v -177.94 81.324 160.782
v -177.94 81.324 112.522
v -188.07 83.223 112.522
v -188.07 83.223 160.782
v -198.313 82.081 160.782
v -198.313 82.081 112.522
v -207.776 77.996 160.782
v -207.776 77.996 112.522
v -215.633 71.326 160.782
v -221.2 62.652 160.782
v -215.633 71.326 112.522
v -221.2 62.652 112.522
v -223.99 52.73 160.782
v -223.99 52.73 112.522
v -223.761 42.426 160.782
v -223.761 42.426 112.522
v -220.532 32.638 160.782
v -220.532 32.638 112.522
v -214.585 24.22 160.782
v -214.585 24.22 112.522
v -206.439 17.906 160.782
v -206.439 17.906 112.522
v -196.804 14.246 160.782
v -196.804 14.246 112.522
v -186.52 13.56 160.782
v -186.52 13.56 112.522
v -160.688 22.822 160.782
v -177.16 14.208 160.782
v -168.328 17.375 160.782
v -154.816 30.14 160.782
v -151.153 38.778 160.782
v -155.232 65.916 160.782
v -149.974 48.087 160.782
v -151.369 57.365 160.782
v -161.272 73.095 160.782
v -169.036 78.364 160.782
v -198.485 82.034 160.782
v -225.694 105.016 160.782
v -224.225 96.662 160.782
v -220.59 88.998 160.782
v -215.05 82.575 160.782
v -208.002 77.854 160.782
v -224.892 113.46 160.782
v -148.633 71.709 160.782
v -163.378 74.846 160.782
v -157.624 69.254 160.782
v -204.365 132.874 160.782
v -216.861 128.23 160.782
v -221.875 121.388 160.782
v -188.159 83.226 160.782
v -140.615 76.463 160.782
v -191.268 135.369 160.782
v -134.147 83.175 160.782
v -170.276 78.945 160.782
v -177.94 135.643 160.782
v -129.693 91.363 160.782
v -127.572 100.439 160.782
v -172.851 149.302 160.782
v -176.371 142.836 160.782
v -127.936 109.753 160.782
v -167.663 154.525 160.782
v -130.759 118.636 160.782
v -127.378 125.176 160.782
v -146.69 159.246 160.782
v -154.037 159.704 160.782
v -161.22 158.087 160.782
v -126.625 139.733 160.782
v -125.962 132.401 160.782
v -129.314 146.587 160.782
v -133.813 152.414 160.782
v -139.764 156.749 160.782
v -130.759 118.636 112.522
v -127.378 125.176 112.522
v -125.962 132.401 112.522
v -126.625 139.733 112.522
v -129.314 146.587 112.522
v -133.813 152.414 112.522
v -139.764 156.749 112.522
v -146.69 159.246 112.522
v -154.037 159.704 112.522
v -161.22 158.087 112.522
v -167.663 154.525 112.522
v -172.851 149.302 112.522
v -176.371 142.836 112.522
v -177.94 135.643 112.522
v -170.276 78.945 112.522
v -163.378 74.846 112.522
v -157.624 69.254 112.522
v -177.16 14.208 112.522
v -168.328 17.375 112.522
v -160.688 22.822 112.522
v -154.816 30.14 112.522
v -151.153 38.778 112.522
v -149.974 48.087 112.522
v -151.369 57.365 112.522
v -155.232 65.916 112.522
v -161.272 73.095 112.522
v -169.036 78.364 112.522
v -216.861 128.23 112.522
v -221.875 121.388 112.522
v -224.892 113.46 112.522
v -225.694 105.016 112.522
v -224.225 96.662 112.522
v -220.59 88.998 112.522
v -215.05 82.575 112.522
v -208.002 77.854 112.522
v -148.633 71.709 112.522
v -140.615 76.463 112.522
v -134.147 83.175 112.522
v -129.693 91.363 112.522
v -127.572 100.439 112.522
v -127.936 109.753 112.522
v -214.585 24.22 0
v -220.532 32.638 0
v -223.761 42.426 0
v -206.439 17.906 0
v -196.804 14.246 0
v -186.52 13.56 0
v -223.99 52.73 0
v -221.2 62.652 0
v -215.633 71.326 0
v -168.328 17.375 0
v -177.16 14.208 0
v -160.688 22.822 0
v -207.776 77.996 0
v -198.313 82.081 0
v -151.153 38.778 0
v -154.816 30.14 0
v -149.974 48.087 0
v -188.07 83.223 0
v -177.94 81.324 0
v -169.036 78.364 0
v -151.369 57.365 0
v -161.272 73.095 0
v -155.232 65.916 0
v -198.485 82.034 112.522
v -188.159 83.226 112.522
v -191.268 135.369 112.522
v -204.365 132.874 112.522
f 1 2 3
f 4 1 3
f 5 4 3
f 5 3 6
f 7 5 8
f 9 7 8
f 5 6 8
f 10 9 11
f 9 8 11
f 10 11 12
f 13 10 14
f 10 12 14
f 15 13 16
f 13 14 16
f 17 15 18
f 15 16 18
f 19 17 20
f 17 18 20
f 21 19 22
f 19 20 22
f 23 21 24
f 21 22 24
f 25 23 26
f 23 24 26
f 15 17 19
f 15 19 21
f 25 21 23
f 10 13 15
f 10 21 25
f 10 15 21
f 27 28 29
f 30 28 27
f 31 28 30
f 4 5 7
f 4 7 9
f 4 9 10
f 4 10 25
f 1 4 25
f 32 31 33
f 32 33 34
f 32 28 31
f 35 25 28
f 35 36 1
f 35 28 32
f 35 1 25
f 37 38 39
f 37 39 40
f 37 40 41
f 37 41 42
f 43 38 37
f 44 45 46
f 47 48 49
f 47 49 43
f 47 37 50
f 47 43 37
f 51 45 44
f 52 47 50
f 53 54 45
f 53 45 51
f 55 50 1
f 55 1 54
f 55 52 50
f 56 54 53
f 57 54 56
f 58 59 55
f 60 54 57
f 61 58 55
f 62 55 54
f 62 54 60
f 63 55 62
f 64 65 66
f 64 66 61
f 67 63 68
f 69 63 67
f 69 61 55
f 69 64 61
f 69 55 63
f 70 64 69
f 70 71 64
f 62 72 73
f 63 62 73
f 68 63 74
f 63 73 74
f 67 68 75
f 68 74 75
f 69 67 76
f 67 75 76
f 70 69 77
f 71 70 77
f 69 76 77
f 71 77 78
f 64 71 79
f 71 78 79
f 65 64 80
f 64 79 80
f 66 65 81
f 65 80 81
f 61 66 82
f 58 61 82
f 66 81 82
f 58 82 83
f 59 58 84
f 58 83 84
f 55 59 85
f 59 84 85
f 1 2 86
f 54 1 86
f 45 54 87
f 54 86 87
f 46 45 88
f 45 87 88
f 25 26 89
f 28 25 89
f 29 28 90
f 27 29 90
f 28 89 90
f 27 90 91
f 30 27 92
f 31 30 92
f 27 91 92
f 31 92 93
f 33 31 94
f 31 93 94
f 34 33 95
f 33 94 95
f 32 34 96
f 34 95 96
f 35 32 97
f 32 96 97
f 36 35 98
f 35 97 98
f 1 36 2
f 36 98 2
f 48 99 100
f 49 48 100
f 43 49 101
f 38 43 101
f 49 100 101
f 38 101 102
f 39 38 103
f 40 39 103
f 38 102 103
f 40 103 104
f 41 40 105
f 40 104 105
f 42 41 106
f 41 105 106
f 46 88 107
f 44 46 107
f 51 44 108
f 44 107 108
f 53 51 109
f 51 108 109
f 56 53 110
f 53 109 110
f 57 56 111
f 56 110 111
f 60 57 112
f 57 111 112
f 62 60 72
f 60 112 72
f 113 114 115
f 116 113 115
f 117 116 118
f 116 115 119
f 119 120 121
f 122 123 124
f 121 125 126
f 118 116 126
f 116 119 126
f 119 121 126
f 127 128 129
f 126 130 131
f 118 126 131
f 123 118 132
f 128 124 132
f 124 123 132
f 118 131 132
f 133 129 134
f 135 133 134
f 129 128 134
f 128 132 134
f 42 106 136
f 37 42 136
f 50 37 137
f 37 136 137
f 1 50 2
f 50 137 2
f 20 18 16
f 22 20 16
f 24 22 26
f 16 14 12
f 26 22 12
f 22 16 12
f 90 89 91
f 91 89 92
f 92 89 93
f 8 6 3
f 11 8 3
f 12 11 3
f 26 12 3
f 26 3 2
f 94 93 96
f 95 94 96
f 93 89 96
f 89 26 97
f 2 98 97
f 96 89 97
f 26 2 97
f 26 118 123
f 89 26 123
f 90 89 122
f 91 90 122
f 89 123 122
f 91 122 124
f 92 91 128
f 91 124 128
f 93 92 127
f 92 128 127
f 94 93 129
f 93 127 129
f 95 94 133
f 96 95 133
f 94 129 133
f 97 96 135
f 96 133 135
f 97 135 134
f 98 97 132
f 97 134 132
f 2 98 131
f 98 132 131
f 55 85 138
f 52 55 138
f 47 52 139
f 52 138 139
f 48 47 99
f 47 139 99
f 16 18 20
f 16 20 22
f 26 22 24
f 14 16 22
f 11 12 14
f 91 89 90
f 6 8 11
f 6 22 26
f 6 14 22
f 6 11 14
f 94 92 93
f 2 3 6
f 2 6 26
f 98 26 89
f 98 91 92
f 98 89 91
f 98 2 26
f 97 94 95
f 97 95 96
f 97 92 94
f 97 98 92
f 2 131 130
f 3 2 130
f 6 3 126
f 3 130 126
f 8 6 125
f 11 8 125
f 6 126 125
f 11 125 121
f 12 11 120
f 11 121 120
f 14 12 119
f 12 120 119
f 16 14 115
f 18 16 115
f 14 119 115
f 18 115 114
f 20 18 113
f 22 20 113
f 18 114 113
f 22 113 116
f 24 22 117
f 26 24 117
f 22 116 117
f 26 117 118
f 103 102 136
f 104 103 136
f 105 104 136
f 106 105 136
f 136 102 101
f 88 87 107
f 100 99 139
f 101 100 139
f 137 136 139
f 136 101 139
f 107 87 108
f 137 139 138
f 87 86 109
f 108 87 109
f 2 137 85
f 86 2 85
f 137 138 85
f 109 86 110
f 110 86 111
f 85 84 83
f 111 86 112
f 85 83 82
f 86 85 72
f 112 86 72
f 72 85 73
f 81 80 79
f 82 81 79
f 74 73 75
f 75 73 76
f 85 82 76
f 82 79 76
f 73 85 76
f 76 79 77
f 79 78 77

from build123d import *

# Parameters (mm, degrees)
F1_DEPTH = 112.522
F3_DEPTH = 48.26
F4_DEPTH = 48.26


with BuildPart() as f1:
    # F0 (on Top) → F1 (new body)
    with BuildSketch(Plane.XY):
        with BuildLine():
            ThreePointArc((-177.939728, 81.324257), (-223.989874, 52.7299), (-186.520085, 13.560166))
            ThreePointArc((-186.520085, 13.560166), (-150.242543, 43.391939), (-177.939728, 81.324257))
        make_face()
    extrude(amount=F1_DEPTH)


with BuildPart() as f3:
    # F2 (on face) → F3 (new body)
    with BuildSketch(Plane.XY.offset(112.522)):
        with BuildLine():
            ThreePointArc((-177.939728, 135.642707), (-197.8688, 134.396175), (-216.860801, 128.229678))
            ThreePointArc((-216.860801, 128.229678), (-225.24105, 100.789456), (-208.002408, 77.854252))
            ThreePointArc((-208.002408, 77.854252), (-193.36672, 83.01702), (-177.939728, 81.324257))
            ThreePointArc((-177.939728, 81.324257), (-166.706672, 77.098805), (-157.624315, 69.253629))
            ThreePointArc((-157.624315, 69.253629), (-131.644741, 87.119177), (-130.759016, 118.63634))
            ThreePointArc((-130.759016, 118.63634), (-143.137888, 158.243508), (-177.939728, 135.642707))
        make_face()
    extrude(amount=F3_DEPTH)


with BuildPart() as f4:
    # F1_face (on face) → F4 (new body)
    with BuildSketch(Plane(origin=(-187.218668, 48.073893, 112.522), x_dir=(1, 0, 0), z_dir=(0, 0, 1))):
        with BuildLine():
            ThreePointArc((0.698583, -34.513728), (36.976125, -4.681954), (9.27894, 33.250364))
            ThreePointArc((9.27894, 33.250364), (-36.771206, 4.656007), (0.698583, -34.513728))
        make_face()
    extrude(amount=F4_DEPTH)


solid = Compound([f1.part, f3.part, f4.part])
